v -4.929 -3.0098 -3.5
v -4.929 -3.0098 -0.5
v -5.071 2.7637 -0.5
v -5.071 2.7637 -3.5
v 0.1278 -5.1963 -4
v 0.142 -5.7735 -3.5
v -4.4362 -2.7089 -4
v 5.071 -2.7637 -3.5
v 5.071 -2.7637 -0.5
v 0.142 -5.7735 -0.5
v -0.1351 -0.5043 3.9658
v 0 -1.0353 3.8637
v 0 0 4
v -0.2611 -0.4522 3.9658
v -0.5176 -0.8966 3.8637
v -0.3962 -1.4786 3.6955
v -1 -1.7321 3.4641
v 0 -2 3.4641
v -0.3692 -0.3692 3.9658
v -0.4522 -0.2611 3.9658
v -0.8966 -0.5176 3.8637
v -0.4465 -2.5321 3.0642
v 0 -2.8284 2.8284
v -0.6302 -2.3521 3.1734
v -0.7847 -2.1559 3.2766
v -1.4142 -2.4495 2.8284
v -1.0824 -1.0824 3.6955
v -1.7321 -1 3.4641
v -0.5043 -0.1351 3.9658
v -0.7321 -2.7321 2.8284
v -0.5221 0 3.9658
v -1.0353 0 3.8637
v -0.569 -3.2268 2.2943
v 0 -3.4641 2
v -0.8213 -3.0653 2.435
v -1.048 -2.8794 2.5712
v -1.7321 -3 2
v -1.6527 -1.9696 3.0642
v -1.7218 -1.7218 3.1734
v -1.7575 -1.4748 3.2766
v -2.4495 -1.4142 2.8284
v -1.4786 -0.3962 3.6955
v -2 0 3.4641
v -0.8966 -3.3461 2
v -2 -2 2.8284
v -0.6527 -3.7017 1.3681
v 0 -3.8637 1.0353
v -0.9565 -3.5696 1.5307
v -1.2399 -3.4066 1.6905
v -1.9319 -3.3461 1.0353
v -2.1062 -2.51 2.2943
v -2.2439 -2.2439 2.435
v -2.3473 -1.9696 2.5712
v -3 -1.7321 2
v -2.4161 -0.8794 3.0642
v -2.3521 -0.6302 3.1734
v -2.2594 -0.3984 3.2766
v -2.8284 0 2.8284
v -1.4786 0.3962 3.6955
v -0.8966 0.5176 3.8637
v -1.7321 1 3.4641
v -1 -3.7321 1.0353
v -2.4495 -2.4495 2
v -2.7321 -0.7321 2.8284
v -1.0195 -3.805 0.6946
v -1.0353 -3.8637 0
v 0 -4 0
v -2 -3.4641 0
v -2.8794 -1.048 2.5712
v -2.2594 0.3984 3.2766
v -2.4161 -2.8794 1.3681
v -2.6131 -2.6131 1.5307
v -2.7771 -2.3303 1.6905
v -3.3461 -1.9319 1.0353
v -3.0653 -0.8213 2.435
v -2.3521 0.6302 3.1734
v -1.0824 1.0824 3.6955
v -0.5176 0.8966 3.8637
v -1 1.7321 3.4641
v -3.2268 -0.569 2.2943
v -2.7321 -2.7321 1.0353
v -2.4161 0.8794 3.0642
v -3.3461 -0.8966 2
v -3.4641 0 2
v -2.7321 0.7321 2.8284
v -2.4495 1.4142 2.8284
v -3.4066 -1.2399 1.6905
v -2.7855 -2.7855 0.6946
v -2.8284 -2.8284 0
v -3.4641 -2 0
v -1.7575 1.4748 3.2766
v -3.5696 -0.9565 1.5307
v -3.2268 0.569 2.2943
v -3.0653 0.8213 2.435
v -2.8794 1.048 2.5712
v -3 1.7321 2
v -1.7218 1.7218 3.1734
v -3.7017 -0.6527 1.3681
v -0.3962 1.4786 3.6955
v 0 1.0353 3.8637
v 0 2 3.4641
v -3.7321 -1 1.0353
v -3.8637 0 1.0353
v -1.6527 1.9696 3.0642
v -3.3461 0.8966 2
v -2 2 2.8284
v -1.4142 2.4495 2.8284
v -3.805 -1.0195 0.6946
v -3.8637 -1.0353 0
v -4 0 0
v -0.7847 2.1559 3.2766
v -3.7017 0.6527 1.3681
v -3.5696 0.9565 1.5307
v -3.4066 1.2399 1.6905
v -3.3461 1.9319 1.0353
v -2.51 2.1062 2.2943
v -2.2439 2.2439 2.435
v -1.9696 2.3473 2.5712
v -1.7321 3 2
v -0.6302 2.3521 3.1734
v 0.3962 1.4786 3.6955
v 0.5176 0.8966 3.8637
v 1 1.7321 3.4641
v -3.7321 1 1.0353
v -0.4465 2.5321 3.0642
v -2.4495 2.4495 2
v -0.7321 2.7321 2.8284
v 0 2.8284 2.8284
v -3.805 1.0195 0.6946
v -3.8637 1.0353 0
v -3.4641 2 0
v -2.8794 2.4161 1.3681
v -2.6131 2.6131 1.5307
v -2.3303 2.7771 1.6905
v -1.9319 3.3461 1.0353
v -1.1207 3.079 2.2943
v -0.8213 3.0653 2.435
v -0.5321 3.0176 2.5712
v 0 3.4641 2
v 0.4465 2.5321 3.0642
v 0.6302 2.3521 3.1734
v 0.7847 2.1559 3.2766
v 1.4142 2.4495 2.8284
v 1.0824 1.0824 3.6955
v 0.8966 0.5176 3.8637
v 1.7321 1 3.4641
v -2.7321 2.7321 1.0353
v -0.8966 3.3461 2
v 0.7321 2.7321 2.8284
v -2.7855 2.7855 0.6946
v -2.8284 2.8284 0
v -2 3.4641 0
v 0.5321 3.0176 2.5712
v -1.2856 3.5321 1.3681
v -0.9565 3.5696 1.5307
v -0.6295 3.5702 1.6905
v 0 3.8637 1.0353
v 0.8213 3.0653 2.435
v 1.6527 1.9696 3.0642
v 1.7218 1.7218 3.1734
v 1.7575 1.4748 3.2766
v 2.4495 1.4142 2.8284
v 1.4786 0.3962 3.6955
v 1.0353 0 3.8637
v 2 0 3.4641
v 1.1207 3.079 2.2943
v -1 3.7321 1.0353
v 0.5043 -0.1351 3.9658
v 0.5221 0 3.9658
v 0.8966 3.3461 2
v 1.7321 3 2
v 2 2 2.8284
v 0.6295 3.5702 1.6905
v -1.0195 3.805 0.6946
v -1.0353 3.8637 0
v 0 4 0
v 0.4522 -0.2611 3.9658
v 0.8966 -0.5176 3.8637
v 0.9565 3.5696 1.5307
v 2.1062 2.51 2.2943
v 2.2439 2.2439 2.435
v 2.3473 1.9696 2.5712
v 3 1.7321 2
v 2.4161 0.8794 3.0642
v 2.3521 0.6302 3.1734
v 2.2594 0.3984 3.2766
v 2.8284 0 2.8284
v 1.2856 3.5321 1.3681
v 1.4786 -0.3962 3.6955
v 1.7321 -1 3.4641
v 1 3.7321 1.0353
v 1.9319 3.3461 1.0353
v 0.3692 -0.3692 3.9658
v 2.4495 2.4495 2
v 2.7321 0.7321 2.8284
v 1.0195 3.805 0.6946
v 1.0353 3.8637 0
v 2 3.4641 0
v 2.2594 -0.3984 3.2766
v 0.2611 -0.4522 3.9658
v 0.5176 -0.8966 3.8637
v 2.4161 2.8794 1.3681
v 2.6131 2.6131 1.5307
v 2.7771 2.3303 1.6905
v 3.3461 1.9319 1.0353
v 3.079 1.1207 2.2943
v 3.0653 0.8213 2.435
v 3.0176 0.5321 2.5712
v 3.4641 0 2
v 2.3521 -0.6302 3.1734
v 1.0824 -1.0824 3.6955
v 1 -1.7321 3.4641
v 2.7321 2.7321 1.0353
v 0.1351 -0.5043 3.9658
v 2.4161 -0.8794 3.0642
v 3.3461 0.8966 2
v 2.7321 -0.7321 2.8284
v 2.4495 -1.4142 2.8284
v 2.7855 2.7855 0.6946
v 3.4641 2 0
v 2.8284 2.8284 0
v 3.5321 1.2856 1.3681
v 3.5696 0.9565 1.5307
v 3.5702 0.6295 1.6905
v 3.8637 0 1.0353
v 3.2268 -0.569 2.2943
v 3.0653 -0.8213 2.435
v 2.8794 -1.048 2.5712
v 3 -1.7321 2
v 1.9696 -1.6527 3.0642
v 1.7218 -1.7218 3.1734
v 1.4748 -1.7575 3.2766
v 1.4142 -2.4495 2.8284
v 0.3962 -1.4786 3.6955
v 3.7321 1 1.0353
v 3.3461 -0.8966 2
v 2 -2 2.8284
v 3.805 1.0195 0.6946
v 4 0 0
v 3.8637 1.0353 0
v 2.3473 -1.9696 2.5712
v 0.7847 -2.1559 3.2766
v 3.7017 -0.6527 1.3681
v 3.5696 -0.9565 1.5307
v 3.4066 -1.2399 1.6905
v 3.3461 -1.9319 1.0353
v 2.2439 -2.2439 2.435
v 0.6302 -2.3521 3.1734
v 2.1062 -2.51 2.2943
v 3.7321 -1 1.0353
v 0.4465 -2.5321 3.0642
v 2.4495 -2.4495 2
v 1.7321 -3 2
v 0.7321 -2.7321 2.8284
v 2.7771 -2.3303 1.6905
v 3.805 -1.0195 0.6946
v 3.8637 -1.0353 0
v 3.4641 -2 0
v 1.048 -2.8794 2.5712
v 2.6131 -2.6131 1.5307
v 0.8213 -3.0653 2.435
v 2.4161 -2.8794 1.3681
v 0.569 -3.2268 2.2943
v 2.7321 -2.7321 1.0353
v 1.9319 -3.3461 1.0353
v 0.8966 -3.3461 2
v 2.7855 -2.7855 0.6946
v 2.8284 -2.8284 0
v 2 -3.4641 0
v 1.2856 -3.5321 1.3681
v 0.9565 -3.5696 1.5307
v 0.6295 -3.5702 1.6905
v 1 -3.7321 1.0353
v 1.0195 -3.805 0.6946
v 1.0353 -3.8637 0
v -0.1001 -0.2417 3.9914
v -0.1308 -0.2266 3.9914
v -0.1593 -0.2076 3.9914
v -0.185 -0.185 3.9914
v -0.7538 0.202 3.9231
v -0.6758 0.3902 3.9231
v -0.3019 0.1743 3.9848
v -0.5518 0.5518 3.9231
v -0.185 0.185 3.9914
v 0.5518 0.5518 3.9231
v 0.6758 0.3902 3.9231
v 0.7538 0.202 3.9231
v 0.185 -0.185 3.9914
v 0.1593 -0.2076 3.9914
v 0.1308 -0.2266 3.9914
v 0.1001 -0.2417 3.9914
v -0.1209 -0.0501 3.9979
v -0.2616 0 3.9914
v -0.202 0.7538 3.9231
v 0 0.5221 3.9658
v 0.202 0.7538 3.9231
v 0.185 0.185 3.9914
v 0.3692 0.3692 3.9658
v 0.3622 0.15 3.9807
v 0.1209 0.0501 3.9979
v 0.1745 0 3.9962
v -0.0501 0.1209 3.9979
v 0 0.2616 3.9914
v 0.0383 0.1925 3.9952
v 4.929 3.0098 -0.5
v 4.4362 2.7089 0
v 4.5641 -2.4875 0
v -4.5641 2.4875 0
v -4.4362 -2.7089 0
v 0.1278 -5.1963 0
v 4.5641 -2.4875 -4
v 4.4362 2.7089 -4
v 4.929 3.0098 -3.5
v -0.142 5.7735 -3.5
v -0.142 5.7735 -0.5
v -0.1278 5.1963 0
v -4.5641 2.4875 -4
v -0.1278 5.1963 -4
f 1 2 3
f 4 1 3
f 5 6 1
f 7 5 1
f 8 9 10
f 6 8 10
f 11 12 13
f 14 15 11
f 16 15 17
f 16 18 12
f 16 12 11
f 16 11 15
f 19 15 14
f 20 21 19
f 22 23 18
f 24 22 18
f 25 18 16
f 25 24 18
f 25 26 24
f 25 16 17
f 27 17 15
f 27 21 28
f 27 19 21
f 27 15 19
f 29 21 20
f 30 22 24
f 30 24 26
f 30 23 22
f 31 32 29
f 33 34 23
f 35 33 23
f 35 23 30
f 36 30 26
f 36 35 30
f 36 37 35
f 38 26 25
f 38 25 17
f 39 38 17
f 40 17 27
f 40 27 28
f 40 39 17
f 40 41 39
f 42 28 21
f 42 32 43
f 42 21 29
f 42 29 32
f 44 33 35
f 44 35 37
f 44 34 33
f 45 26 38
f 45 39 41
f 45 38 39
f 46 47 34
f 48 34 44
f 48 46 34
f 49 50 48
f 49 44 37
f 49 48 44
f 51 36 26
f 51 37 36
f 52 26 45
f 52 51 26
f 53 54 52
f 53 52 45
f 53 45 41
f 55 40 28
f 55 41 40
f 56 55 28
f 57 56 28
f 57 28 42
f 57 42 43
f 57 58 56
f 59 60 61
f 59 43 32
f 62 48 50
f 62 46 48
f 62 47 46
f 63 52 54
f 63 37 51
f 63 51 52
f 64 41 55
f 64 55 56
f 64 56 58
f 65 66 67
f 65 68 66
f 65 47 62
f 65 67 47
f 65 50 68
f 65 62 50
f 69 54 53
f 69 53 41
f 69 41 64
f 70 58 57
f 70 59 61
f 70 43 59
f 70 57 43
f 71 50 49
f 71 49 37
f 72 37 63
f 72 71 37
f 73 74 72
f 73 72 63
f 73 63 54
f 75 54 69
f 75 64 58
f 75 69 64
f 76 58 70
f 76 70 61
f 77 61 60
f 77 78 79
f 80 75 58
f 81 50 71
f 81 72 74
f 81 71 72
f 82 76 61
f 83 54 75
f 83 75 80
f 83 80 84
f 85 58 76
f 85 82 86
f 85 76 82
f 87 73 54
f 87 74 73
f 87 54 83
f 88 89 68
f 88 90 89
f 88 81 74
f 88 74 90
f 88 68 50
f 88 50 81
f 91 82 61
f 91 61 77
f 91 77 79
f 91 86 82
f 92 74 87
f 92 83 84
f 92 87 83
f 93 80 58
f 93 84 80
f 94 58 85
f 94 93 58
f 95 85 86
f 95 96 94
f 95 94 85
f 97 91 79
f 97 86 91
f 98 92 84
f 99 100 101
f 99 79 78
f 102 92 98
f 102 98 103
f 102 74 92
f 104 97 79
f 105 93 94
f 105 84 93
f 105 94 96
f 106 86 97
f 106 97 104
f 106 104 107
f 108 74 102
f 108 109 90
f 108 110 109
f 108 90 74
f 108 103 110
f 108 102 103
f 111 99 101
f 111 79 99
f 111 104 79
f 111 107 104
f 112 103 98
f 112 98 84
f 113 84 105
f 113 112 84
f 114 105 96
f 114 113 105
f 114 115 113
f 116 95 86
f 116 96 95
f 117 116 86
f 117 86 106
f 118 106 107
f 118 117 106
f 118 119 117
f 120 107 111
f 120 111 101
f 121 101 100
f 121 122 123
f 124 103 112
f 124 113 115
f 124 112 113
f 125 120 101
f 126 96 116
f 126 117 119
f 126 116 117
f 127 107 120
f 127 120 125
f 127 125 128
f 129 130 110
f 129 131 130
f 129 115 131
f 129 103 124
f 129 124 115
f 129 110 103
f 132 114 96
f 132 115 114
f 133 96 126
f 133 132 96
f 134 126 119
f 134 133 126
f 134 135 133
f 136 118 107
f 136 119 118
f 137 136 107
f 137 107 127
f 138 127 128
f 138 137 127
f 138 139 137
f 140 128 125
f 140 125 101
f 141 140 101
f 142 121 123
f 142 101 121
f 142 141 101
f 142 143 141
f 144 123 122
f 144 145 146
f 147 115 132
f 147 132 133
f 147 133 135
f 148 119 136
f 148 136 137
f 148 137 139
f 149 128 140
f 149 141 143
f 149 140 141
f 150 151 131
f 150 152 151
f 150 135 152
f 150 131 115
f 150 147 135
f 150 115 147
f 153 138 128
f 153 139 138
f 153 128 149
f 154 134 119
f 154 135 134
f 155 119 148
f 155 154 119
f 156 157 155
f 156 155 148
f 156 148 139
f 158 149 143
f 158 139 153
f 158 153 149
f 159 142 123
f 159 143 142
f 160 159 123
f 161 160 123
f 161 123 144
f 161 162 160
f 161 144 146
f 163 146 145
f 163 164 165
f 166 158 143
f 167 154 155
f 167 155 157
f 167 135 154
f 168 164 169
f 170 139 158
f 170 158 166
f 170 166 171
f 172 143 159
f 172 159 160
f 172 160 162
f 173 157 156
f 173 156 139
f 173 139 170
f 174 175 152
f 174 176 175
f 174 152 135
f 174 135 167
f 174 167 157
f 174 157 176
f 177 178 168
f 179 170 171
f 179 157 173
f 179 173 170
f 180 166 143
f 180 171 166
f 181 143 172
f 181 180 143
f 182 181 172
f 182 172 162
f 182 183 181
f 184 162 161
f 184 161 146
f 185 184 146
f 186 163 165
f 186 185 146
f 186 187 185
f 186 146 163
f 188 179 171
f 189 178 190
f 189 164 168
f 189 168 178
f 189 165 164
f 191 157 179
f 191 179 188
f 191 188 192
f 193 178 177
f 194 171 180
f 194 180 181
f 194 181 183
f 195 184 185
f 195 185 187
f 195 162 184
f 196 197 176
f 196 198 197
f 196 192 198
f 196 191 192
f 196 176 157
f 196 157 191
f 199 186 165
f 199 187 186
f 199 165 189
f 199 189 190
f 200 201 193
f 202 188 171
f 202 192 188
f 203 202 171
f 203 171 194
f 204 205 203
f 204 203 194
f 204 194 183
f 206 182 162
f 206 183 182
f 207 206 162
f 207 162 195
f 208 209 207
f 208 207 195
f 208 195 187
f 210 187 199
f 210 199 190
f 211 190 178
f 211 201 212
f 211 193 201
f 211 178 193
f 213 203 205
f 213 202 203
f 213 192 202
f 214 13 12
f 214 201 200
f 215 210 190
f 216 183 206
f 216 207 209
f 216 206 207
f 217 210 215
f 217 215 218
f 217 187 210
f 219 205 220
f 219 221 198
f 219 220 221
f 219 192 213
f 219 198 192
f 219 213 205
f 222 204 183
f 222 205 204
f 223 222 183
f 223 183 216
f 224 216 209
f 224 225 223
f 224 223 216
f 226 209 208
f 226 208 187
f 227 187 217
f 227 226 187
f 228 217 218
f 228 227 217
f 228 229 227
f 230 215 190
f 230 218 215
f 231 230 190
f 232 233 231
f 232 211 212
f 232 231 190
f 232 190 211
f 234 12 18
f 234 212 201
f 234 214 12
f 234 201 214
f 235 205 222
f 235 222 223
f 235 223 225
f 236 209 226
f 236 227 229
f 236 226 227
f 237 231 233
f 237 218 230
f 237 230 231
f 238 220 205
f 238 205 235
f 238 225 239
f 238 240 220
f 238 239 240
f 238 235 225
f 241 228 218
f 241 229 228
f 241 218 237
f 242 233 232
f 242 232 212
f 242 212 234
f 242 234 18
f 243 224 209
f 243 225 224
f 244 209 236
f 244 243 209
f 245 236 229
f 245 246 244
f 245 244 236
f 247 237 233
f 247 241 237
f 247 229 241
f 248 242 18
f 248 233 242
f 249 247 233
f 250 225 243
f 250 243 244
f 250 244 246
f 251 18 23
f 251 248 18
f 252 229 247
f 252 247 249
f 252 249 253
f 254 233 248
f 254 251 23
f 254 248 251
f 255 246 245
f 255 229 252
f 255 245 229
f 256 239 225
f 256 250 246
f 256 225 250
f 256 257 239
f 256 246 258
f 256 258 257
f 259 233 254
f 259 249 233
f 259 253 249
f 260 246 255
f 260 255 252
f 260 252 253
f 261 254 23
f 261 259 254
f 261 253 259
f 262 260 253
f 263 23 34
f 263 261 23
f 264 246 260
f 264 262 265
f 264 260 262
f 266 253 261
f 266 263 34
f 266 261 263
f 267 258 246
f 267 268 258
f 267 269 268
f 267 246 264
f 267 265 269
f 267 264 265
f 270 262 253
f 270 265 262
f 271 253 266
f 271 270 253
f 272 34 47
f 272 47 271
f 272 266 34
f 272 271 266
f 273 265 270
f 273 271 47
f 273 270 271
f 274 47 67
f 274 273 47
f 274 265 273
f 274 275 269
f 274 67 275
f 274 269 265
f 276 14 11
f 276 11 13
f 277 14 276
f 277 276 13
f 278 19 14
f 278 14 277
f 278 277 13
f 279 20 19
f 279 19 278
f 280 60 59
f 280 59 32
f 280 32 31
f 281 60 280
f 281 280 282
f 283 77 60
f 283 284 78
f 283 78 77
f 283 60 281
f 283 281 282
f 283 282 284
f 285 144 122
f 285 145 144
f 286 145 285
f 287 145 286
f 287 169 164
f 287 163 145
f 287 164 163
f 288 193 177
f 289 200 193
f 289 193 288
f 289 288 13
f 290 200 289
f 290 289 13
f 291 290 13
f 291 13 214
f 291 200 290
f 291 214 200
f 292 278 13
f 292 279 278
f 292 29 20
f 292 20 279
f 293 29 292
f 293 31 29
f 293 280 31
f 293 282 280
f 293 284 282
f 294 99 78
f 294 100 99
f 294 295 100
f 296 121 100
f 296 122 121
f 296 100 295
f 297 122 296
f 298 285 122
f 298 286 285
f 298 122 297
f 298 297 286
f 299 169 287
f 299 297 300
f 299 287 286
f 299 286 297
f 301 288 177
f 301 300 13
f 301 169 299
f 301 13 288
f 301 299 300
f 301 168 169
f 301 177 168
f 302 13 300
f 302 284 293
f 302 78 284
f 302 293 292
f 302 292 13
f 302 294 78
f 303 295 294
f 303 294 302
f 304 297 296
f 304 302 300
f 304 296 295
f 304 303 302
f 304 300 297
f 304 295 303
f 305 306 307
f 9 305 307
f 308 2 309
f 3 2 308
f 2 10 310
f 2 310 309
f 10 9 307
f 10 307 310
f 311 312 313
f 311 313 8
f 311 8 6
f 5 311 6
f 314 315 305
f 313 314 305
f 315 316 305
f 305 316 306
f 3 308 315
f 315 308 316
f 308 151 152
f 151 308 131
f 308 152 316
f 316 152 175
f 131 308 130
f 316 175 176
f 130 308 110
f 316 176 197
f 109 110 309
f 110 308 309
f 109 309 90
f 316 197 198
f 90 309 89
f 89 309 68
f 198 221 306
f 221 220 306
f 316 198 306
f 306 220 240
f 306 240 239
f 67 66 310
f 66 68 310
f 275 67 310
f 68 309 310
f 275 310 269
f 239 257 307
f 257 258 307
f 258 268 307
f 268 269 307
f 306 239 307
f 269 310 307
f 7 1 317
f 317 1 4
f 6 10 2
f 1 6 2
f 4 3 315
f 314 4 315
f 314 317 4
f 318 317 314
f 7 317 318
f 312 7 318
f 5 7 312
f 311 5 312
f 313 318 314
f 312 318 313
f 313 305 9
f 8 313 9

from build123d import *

# Parameters (mm, degrees)
F3_DEPTH = 4
F4_SIZE  = 0.5


with BuildPart() as f1:
    # F0 (on Right) → F1 (revolve)
    with BuildSketch(Plane.YZ):
        with BuildLine():
            Line((0, 0), (0, 4))
            ThreePointArc((0, 4), (-2.828427, 2.828427), (-4, 0))
            Line((-4, 0), (0, 0))
        make_face()
    revolve(axis=Axis((0, 0, 2), (0, 0, -1)))

    # F2 (on face) → F3 (join)
    with BuildSketch(Plane(origin=(0, 0, 0), x_dir=(1, 0, 0), z_dir=(0, 0, -1))):
        Polygon((-0.142033, -5.773503), (4.928983, -3.009756), (5.071017, 2.763747), (0.142033, 5.773503), (-4.928983, 3.009756), (-5.071017, -2.763747), align=None)
    extrude(amount=F3_DEPTH)

    # F4
    f4_edges = [f1.edges().sort_by_distance(p)[0] for p in [
        (2.606525, -4.268625, 0),
        (5, 0.123005, 0),
        (2.393475, 4.391629, 0),
        (2.606525, -4.268625, -4),
        (-2.393475, -4.391629, -4),
        (-2.393475, -4.391629, 0),
        (-2.606525, 4.268625, 0),
        (-5, -0.123005, 0),
        (2.393475, 4.391629, -4),
        (-2.606525, 4.268625, -4),
        (5, 0.123005, -4),
        (-5, -0.123005, -4),
    ]]
    chamfer(f4_edges, length=F4_SIZE)


solid = f1.part
